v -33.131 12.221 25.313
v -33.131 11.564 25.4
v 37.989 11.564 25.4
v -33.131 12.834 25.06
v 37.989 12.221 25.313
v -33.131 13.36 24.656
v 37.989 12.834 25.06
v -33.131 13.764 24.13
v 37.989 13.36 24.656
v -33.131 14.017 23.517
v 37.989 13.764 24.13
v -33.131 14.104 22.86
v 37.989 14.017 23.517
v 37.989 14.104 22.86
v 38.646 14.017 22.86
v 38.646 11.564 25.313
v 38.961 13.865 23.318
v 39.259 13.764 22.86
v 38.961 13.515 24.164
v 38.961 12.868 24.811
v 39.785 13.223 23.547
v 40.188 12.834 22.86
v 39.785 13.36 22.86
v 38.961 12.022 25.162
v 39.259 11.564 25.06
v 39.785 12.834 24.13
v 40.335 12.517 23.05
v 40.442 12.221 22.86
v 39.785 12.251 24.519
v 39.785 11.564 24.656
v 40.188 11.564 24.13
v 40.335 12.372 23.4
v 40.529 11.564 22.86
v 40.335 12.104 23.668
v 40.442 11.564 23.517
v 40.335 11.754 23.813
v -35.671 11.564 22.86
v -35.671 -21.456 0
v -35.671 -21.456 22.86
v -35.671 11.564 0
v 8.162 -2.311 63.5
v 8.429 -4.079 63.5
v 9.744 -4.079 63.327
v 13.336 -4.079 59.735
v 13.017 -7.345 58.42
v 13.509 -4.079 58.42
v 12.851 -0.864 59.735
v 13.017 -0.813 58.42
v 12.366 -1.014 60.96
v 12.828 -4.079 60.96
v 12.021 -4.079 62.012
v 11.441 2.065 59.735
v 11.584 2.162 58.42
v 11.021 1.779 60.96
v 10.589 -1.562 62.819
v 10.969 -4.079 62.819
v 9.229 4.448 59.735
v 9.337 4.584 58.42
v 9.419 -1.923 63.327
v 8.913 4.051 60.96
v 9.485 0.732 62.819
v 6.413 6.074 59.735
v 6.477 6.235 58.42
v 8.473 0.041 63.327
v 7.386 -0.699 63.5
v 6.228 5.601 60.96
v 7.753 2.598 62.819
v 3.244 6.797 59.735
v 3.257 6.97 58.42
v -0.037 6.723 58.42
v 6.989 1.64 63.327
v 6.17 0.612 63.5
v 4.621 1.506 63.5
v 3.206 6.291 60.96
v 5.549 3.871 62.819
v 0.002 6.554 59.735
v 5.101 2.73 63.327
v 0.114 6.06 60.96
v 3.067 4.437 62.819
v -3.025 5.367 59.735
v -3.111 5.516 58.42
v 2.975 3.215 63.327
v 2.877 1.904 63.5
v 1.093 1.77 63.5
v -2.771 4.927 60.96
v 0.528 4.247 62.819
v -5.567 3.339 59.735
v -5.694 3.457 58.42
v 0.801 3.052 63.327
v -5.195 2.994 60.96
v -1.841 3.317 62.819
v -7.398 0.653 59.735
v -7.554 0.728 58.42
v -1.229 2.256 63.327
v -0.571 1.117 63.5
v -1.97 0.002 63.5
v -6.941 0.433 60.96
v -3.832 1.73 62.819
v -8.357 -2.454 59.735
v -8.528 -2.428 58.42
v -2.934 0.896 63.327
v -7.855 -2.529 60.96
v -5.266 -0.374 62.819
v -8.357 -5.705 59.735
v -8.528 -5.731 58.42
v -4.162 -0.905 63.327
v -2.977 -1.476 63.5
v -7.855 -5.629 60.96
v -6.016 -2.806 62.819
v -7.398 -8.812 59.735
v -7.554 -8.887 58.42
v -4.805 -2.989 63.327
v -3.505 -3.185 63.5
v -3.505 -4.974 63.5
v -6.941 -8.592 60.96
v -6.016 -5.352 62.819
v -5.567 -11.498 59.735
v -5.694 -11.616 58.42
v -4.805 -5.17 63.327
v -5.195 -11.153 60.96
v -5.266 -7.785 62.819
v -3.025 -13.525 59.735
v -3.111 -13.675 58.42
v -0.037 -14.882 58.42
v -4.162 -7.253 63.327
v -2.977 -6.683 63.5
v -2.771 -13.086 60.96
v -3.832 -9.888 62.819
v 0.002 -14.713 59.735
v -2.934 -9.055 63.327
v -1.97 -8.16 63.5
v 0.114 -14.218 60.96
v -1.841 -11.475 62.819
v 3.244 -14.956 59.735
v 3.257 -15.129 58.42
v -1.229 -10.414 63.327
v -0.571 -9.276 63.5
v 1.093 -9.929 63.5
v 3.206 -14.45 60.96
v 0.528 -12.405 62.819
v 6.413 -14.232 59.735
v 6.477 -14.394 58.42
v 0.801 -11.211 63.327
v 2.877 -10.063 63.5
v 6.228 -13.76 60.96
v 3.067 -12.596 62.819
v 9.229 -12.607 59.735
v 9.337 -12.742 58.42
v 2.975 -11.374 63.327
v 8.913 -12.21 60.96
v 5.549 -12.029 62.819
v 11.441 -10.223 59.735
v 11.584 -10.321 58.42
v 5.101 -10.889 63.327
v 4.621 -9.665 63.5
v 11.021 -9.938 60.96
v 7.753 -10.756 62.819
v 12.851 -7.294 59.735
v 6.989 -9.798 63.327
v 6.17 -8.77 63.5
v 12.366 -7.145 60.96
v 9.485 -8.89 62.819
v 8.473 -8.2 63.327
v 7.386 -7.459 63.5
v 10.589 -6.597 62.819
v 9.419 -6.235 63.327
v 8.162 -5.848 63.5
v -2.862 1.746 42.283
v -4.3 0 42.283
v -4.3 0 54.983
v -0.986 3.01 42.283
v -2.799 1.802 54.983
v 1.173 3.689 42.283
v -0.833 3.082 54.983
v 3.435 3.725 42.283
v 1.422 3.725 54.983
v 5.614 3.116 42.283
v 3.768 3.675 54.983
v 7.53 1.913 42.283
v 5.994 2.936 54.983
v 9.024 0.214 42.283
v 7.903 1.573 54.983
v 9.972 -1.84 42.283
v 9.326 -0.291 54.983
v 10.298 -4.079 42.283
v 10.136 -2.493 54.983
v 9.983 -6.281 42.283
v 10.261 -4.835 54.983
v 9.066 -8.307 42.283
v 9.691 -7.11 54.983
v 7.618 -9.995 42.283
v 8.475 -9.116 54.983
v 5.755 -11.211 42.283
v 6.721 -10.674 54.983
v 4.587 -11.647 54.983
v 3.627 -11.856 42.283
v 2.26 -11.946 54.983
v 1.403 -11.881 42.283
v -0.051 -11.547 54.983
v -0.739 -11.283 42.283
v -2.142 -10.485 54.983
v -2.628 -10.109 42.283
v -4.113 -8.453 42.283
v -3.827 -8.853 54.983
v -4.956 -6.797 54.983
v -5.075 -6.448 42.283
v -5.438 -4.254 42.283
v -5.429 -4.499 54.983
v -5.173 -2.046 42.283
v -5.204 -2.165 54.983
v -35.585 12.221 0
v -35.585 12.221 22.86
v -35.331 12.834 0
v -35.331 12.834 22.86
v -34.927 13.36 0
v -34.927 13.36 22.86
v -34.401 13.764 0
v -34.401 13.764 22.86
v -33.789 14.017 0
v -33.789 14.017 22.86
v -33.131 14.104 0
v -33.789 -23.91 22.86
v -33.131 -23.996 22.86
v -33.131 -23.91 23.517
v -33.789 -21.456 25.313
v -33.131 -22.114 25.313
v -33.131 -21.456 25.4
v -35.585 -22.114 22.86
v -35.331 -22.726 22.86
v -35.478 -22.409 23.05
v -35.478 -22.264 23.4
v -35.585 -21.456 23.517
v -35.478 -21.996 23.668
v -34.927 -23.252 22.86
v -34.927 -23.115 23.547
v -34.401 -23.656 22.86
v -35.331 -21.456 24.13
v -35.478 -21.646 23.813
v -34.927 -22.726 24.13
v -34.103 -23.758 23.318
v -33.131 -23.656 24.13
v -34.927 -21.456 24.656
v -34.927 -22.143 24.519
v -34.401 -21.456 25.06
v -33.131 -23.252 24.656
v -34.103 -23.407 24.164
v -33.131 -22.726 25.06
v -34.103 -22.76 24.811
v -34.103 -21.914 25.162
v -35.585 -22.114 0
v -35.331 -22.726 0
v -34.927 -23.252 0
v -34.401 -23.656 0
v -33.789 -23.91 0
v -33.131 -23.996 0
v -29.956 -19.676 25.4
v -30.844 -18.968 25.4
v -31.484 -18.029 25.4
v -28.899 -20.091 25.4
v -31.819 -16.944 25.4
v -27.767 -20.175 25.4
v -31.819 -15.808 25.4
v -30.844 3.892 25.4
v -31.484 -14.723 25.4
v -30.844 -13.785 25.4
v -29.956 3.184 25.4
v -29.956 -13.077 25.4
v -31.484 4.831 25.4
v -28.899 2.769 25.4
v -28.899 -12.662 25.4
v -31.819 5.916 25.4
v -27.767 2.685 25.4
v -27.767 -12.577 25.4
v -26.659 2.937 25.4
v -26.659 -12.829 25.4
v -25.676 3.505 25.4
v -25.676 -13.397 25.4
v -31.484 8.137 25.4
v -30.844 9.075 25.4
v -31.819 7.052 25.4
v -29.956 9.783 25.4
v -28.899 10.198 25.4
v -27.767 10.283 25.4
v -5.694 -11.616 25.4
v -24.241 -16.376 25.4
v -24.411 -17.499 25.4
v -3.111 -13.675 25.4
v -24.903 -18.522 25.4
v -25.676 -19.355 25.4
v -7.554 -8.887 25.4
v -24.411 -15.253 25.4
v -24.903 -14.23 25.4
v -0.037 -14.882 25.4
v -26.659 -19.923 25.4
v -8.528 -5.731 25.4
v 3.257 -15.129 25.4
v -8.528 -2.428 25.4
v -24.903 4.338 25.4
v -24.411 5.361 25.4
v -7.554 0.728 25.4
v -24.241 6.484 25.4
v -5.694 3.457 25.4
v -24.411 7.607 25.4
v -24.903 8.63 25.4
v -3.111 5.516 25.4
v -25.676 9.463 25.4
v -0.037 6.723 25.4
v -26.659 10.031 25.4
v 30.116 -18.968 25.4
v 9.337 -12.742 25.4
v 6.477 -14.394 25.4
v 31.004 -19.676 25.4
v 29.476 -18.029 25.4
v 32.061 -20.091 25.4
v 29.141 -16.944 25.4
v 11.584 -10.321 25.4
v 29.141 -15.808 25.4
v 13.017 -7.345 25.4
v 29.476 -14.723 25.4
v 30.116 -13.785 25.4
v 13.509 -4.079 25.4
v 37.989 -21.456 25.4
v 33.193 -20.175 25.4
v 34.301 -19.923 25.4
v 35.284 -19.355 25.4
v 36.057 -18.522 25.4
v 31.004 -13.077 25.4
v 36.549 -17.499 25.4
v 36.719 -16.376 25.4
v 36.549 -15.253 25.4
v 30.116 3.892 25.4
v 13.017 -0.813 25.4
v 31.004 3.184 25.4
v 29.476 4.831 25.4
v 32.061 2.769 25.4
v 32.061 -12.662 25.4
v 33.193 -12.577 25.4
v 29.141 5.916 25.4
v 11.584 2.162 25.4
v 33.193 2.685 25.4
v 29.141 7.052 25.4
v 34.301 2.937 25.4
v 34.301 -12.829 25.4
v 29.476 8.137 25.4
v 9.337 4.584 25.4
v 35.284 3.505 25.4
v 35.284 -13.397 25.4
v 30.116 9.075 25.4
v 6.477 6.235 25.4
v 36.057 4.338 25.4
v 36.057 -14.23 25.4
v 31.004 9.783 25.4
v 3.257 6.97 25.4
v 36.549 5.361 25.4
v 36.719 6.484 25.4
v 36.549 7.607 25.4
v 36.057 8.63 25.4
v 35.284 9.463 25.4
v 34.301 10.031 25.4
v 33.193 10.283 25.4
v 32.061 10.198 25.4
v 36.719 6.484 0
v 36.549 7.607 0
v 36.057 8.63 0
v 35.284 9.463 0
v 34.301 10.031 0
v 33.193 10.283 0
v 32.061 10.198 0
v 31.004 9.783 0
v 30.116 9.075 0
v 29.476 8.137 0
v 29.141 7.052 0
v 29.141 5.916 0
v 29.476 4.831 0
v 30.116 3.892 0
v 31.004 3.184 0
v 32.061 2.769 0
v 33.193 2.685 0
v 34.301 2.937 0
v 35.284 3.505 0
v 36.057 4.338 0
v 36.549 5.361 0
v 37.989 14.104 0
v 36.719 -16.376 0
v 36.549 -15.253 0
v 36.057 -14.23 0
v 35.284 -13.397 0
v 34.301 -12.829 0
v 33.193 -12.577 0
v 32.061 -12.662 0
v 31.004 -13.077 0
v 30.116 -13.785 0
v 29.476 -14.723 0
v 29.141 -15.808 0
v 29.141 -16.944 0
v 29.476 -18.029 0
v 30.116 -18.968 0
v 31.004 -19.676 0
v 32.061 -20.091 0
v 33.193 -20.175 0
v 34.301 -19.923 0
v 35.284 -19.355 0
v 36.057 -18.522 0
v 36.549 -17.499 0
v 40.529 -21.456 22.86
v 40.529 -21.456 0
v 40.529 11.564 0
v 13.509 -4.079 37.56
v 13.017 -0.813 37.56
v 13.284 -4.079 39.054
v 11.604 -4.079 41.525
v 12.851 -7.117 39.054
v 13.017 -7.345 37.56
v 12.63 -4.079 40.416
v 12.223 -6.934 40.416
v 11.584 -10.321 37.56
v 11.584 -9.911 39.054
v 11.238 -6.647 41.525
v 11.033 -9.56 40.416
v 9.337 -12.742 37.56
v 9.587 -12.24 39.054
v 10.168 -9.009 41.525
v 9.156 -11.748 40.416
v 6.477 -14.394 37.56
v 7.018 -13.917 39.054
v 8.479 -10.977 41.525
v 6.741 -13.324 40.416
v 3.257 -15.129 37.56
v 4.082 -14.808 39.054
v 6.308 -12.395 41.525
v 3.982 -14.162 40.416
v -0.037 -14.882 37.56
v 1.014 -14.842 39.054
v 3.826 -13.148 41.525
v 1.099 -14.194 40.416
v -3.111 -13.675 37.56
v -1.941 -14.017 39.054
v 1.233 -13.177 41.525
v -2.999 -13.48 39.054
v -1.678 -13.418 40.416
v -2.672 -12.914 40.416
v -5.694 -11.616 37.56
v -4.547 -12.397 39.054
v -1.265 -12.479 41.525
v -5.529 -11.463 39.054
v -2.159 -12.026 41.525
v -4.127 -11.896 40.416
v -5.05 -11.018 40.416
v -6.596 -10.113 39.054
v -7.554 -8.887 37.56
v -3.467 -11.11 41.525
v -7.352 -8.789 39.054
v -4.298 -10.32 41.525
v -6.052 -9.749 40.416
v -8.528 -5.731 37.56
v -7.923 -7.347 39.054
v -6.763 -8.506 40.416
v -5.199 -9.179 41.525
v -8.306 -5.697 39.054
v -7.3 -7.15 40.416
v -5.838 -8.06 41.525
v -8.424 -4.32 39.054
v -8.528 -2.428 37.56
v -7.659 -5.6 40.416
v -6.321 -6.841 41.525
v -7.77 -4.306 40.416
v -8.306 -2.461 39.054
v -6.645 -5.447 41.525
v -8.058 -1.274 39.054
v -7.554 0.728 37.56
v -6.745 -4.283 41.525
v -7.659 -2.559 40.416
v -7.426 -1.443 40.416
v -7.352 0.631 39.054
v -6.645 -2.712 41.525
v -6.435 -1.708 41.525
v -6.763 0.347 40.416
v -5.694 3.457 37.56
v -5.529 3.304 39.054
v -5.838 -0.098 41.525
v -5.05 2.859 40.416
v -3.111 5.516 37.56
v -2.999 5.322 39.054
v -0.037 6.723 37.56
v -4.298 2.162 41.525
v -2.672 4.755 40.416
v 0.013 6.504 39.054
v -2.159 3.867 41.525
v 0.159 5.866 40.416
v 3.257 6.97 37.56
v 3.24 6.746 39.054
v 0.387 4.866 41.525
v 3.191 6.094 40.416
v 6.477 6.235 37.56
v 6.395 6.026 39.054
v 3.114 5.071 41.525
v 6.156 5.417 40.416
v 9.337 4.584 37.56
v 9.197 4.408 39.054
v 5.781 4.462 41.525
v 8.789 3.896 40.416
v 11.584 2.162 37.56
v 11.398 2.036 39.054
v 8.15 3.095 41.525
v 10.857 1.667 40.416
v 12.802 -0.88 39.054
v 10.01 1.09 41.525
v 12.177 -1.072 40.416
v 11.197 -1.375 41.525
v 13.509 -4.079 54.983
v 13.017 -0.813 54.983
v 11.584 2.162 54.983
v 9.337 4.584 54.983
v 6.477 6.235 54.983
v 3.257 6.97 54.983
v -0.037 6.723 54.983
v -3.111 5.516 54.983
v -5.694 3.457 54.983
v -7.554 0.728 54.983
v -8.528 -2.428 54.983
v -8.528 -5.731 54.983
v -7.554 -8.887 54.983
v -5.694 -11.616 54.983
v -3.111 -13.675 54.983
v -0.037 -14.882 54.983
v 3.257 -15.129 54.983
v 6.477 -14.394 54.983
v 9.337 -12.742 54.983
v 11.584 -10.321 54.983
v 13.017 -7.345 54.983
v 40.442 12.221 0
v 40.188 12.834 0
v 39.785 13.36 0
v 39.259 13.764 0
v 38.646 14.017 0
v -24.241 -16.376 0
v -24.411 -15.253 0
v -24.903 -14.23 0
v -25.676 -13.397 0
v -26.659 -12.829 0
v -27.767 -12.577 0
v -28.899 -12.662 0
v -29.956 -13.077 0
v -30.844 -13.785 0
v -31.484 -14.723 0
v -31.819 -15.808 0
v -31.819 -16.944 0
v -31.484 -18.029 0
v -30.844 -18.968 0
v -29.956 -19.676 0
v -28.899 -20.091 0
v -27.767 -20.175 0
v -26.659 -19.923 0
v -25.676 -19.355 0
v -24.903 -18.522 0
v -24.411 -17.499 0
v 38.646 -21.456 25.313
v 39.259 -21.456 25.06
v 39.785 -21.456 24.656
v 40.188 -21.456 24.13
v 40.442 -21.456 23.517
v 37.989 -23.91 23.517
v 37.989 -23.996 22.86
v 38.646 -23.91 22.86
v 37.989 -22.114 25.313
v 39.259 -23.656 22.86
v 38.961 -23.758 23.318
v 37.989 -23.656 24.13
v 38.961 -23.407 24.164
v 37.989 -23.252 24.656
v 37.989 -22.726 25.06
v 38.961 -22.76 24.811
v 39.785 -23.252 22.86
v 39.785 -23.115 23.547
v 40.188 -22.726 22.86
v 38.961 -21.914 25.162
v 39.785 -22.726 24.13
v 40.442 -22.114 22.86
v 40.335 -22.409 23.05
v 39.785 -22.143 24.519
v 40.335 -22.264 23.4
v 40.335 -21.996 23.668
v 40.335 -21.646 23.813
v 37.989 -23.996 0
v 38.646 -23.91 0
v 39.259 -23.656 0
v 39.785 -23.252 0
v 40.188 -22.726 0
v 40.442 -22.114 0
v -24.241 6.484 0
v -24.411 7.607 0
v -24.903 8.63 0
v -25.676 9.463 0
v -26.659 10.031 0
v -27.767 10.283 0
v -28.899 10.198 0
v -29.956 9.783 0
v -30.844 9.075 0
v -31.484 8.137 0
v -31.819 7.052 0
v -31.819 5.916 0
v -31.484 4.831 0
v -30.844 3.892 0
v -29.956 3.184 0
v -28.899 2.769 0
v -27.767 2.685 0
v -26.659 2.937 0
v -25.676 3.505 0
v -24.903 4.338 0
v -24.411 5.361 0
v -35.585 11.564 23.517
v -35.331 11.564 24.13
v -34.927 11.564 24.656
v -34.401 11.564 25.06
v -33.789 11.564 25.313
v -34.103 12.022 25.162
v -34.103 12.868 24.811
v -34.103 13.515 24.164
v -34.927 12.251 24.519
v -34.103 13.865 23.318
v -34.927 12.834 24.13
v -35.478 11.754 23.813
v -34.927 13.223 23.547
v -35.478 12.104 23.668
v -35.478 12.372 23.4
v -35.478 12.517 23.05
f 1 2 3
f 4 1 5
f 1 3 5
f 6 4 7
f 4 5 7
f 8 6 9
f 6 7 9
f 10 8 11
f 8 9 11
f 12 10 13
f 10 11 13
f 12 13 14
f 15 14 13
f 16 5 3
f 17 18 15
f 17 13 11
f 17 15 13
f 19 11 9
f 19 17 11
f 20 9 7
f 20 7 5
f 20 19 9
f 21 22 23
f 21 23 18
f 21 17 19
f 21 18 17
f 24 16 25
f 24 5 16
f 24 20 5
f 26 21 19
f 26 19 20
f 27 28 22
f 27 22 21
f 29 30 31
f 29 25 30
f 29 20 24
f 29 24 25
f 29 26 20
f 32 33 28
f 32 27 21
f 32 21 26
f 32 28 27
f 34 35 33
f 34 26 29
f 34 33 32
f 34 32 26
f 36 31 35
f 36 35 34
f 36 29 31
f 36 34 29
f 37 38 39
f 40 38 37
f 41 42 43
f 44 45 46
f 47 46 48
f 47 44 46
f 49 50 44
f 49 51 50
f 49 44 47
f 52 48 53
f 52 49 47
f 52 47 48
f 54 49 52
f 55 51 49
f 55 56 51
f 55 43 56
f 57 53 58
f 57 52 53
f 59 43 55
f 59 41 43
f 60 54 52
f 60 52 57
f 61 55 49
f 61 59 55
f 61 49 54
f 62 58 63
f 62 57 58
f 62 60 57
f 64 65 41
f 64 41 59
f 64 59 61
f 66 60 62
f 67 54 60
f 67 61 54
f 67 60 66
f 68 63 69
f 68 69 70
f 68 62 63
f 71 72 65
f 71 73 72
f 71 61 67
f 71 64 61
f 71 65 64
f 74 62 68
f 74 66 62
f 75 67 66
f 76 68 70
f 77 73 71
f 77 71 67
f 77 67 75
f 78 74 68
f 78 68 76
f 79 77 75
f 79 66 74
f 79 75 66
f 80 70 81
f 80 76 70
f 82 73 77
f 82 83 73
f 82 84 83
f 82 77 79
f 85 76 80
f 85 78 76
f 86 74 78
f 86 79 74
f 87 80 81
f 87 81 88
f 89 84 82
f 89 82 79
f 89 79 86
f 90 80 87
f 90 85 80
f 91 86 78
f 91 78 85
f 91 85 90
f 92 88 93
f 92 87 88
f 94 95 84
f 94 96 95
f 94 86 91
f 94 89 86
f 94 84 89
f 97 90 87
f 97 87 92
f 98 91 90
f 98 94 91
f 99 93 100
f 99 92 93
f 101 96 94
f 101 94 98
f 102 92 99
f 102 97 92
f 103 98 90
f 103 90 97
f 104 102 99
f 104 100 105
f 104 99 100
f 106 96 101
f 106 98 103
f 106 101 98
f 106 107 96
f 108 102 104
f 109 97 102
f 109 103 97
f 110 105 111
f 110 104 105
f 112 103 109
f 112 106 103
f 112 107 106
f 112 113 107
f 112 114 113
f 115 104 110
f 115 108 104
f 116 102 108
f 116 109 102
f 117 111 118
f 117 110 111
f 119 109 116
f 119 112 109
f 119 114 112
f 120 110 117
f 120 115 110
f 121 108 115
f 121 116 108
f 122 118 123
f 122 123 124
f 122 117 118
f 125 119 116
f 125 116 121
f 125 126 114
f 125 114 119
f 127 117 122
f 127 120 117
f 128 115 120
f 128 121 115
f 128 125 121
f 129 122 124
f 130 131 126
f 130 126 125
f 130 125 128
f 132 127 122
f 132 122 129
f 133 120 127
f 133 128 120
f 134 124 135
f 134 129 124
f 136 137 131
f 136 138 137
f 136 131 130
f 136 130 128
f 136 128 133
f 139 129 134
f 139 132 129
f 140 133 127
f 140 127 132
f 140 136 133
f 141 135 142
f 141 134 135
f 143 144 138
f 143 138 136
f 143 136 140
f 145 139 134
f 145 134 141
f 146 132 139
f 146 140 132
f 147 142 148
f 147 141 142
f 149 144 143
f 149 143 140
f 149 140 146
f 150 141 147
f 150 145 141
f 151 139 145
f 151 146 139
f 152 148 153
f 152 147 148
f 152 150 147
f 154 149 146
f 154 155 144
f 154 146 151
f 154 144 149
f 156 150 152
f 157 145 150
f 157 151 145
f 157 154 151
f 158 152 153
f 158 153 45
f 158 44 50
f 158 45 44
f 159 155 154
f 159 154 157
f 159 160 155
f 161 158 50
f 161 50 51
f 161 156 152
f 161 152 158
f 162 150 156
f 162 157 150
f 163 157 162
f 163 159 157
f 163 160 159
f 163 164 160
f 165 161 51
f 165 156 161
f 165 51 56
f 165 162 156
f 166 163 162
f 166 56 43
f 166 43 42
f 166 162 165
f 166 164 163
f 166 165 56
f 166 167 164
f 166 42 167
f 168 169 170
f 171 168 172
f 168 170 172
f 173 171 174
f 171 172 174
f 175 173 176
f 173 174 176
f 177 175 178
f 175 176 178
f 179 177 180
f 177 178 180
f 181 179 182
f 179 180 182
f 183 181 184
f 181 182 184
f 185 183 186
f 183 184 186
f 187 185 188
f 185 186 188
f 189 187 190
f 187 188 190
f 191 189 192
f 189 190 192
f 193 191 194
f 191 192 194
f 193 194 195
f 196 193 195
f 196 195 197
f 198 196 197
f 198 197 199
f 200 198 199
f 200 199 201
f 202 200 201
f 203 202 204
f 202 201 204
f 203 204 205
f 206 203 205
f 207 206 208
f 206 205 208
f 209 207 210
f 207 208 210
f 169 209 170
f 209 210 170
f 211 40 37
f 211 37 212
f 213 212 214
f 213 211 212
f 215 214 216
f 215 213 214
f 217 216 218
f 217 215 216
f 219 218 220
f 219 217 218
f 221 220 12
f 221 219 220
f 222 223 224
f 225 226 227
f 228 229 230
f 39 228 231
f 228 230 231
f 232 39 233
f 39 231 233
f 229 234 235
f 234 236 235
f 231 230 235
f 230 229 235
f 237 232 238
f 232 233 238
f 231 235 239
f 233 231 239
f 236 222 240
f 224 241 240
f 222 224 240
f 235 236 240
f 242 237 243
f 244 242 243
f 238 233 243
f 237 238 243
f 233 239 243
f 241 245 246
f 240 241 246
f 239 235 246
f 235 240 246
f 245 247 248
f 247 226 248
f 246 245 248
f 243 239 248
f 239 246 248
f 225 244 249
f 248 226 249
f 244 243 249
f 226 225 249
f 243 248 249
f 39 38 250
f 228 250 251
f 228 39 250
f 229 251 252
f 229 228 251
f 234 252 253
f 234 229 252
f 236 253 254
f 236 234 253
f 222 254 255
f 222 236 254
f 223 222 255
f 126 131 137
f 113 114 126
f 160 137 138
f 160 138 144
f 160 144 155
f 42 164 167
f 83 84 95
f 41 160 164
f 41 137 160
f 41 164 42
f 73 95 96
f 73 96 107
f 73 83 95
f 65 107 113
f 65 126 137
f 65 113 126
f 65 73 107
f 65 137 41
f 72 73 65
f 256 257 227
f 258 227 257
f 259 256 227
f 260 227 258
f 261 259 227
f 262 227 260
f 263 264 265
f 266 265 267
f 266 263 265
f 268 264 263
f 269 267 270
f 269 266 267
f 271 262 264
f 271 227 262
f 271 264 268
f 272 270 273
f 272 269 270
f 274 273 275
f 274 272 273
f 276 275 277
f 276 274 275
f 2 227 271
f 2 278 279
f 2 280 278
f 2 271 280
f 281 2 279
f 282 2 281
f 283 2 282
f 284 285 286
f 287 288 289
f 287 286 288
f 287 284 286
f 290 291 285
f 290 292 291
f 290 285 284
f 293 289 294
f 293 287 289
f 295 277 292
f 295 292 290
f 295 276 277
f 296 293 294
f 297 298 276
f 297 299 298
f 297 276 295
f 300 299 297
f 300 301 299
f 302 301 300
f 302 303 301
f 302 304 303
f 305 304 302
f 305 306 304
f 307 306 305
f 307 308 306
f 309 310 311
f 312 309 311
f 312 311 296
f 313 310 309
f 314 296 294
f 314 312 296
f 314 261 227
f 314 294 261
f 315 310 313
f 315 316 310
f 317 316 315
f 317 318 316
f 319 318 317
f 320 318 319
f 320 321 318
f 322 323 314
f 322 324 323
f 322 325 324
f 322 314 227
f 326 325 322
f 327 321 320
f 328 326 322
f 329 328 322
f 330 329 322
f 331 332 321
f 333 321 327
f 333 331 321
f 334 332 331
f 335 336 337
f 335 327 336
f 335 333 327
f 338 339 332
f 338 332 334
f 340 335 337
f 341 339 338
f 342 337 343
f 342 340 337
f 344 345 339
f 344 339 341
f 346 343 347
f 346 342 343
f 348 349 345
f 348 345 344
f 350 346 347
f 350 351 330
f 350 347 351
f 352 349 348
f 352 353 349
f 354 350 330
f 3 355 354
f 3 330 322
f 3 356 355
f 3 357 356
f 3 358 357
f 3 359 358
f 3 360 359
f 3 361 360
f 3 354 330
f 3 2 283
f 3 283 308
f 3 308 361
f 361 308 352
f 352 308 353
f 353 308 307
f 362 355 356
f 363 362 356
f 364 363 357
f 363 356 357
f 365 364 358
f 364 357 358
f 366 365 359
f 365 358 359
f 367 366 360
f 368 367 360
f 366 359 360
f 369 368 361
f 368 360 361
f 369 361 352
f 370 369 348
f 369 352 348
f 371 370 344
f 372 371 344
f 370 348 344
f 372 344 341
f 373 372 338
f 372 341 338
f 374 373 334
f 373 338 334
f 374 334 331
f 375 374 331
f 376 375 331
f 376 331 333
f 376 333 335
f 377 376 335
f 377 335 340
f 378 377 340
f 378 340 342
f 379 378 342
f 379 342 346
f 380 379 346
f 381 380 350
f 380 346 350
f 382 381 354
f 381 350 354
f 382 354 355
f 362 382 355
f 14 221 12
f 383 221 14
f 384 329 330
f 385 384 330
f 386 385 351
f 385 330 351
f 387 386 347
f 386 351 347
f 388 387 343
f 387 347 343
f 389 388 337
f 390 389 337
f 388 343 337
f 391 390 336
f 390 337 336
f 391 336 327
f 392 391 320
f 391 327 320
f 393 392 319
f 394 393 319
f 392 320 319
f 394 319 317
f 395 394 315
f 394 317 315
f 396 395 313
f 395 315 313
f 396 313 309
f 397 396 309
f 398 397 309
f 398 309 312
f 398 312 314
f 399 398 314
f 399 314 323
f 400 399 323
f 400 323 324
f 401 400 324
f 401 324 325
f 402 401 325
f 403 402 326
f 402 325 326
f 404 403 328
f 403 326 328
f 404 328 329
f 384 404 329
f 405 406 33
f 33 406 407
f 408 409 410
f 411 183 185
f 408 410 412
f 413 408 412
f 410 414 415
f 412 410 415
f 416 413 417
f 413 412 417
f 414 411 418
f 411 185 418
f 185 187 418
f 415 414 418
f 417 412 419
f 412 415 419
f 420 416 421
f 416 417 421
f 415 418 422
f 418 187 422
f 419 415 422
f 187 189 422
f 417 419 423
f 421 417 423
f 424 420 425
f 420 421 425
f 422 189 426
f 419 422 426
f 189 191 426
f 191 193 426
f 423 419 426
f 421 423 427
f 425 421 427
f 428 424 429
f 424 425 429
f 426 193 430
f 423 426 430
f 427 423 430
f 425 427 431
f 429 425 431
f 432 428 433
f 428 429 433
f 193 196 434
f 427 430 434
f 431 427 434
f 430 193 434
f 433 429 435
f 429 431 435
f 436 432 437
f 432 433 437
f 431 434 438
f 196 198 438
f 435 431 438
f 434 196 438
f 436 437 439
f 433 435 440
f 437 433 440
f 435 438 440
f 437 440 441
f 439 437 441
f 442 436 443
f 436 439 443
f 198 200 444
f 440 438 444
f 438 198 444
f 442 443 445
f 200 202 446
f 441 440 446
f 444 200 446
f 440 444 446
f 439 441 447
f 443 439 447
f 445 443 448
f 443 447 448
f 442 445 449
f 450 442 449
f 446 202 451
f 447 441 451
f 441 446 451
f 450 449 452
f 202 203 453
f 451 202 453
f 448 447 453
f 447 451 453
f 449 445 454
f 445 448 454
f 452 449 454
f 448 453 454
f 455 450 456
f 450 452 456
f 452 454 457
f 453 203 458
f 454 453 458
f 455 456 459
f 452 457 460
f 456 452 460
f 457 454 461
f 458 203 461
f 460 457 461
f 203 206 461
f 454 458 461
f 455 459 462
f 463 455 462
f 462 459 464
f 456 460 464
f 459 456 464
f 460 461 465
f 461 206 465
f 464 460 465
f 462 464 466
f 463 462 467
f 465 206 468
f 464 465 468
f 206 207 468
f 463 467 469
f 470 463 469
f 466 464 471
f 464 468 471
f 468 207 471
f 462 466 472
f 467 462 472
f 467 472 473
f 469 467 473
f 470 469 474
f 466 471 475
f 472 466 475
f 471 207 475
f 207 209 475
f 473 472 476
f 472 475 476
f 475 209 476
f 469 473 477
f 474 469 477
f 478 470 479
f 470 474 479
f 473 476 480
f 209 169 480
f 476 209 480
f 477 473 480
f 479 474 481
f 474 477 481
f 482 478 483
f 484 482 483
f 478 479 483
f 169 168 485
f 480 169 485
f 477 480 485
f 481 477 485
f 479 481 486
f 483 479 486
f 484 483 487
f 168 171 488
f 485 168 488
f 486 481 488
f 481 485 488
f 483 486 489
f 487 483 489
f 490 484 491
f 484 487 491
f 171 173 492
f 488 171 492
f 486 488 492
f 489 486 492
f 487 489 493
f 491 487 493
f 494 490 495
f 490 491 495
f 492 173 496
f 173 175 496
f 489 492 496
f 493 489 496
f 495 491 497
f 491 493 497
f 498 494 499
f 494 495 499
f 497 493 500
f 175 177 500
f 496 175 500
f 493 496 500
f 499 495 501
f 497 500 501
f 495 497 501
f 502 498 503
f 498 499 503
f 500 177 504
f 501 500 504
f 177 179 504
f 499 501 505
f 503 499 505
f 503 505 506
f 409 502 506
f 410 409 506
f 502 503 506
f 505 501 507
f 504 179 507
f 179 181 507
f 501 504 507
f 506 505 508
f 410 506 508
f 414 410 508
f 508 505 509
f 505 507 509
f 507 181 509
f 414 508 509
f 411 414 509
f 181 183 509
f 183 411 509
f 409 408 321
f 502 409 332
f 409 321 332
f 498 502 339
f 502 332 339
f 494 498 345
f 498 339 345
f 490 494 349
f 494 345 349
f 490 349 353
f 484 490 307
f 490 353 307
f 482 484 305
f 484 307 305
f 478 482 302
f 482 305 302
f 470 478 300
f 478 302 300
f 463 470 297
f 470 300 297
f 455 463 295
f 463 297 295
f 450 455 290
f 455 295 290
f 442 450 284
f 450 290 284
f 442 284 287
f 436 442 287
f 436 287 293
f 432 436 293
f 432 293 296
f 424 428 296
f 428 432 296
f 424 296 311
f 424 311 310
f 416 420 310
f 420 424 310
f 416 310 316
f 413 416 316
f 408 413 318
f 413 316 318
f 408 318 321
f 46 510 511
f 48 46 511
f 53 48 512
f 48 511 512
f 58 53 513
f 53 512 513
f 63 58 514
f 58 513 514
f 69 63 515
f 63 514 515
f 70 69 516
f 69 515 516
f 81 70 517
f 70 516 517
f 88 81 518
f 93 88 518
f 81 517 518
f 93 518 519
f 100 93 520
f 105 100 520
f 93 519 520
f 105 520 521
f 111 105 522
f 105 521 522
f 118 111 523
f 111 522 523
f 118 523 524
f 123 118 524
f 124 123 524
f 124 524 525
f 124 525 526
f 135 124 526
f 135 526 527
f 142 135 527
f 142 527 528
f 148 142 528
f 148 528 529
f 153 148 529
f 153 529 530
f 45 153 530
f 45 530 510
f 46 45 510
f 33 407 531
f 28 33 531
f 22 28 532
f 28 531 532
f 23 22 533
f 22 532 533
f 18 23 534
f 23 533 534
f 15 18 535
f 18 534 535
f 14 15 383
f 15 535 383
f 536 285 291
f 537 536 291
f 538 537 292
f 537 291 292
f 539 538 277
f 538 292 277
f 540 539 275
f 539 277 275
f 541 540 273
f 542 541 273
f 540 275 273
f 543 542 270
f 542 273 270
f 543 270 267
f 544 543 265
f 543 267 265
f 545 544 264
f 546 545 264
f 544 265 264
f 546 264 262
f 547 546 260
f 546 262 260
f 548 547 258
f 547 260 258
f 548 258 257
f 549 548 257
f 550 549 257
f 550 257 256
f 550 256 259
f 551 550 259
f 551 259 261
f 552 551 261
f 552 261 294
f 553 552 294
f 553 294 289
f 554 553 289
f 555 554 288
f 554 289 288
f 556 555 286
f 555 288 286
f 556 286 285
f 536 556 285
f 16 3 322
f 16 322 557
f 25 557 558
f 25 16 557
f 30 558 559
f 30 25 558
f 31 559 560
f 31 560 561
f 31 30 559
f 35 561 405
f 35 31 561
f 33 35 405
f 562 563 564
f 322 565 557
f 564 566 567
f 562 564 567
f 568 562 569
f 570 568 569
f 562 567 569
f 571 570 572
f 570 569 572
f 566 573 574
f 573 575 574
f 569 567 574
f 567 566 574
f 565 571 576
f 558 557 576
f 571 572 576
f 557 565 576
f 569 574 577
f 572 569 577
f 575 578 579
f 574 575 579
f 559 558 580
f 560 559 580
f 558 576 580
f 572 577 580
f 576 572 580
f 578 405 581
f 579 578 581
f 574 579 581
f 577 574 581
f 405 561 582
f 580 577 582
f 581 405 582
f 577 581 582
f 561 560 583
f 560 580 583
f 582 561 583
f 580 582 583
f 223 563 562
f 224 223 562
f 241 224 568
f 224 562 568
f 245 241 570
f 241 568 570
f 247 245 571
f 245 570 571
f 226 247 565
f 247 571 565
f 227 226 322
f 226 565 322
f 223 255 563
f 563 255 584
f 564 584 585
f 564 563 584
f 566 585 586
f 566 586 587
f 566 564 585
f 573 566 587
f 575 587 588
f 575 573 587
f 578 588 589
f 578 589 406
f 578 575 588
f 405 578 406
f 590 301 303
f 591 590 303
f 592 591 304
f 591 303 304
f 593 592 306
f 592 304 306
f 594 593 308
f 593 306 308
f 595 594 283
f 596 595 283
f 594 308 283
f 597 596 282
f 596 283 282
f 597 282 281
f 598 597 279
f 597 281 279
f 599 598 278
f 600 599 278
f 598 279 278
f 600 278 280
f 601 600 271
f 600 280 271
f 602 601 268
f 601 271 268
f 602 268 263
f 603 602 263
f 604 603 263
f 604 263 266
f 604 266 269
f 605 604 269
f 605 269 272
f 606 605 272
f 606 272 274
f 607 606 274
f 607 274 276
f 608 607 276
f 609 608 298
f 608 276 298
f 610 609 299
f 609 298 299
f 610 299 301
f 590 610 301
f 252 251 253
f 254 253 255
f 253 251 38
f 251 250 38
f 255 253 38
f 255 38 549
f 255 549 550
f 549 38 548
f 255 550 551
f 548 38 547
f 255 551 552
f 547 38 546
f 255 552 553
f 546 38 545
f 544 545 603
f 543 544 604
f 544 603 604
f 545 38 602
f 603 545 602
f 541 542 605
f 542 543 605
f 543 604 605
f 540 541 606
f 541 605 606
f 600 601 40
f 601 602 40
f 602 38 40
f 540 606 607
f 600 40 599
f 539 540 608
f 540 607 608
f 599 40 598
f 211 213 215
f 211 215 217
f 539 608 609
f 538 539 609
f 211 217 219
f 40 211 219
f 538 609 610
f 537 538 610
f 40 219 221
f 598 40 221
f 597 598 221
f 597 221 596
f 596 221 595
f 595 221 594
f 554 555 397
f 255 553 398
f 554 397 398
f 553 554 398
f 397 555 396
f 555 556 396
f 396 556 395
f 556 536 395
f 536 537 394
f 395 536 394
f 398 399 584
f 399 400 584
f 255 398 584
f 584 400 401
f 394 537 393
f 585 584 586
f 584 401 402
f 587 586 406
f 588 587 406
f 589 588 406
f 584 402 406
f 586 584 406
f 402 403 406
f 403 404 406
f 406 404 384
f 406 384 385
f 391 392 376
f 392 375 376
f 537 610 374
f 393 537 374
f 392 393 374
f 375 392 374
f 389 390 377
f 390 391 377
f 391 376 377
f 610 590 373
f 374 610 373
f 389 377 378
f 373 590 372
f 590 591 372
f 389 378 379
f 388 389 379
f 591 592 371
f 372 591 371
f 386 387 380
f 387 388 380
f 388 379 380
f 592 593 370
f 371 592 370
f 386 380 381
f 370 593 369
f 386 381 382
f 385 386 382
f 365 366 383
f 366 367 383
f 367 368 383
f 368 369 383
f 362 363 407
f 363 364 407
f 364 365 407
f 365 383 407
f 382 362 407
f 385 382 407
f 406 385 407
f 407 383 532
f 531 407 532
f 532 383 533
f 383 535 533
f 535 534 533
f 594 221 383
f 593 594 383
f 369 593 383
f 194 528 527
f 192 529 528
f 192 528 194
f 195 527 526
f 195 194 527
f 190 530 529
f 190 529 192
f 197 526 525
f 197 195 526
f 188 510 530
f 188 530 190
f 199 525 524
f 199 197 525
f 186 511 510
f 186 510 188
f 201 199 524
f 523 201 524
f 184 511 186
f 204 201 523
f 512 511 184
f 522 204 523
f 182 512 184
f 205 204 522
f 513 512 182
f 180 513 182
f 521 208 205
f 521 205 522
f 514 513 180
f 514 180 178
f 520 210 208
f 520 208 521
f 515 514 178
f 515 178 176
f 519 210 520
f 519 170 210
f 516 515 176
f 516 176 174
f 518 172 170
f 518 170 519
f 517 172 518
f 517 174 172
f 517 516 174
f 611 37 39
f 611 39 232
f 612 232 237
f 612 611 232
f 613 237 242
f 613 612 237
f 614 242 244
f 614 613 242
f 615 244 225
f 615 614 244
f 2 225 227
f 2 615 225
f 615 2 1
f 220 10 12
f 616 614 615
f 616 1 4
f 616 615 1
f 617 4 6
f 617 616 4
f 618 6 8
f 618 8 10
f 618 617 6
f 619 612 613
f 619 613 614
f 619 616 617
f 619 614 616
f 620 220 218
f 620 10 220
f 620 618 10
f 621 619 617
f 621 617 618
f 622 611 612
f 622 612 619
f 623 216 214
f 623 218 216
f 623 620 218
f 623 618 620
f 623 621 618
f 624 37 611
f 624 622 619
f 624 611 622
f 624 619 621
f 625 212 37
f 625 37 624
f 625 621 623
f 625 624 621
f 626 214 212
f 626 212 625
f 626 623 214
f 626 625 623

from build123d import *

# Parameters (mm, degrees)
F0_W          = 76.2
F0_H          = 38.1
F1_DEPTH      = 25.4
F3_R          = 3.81
F4_DEPTH      = 25.4
F5_R          = 11.0802185983
F6_DEPTH      = 38.1
F2_R          = 3.81
F7_DEPTH      = 25.4
F8_R          = 3.81
F9_DEPTH      = 25.4
F11_R         = 3.81
F12_DEPTH     = 25.4
F10_W         = 12.7
F10_H         = 12.7
F14_R         = 2.54
F15_R         = 2.54
F17_T1_DEPTH  = 29.21
F17_S5_W      = 2.54
F17_S5_H      = 2.54
F17_T6_DEPTH  = 2.54
F17_S11_W     = 2.54
F17_S11_H     = 2.54
F17_T12_DEPTH = 2.54


# Not quite as in the source:
# - a fillet or chamfer that OpenCascade refuses, or shapes differently, is made with other operations: its cross-section is extruded or revolved along the edge and cut away or added


with BuildPart() as f1:
    # F0 (on Top) → F1 (new body)
    with BuildSketch(Plane.XY):
        with Locations((2.4286340922, -4.9461158044)):
            Rectangle(F0_W, F0_H)
    extrude(amount=F1_DEPTH)

    # F3 (on face) → F4 (cut)
    with BuildSketch(Plane.XY.offset(25.4)):
        with Locations((32.9086340922, 6.4838841956)):
            Circle(F3_R)
    extrude(amount=-F4_DEPTH, mode=Mode.SUBTRACT)

    # F5 (on face) → F6 (join)
    with BuildSketch(Plane.XY.offset(25.4)):
        with Locations((2.4286331609, -4.0792874061)):
            Circle(F5_R)
    extrude(amount=F6_DEPTH)

    # F2 (on face) → F7 (cut)
    with BuildSketch(Plane.XY.offset(25.4)):
        with Locations((-28.0513659078, 6.4838841956)):
            Circle(F2_R)
    extrude(amount=-F7_DEPTH, mode=Mode.SUBTRACT)

    # F8 (on face) → F9 (cut)
    with BuildSketch(Plane.XY.offset(25.4)):
        with Locations((-28.0513659078, -16.3761158044)):
            Circle(F8_R)
    extrude(amount=-F9_DEPTH, mode=Mode.SUBTRACT)

    # F11 (on face) → F12 (cut)
    with BuildSketch(Plane.XY.offset(25.4)):
        with Locations((32.9086340922, -16.3761158044)):
            Circle(F11_R)
    extrude(amount=-F12_DEPTH, mode=Mode.SUBTRACT)

    # F10 (on Front) → F13 (revolve, cut)
    with BuildSketch(Plane.XZ):
        with Locations((-10.6504372485, 48.6334538215)):
            Rectangle(F10_W, F10_H)
    revolve(axis=Axis((2.4286331609, -4.0792874061, 25.4), (0, 0, -1)), mode=Mode.SUBTRACT)

    # F14
    f14_edges = [f1.edges().sort_by_distance(p)[0] for p in [
        (2.428634, -23.996116, 25.4),
    ]]
    fillet(f14_edges, radius=F14_R)

    # F15
    f15_edges = [f1.edges().sort_by_distance(p)[0] for p in [
        (-35.671366, -3.676116, 25.4),
        (2.428634, 14.103884, 25.4),
        (40.528634, -3.676116, 25.4),
    ]]
    fillet(f15_edges, radius=F15_R)

    # F16: fillet of radius 5.08 on 2 edges, made by hand

    # F16_s1 → F16_t2 (revolve, cut)
    with BuildSketch(Plane.XZ.offset(4.0792874061)):
        with BuildLine():
            ThreePointArc((13.5088517592, 58.42), (12.0209542077, 62.0121024484), (8.4288517592, 63.5))
            Line((8.4288517592, 63.5), (8.4288517592, 63.6016))
            Line((8.4288517592, 63.6016), (13.6104517592, 63.6016))
            Line((13.6104517592, 63.6016), (13.6104517592, 58.42))
            Line((13.6104517592, 58.42), (13.5088517592, 58.42))
        make_face()
    revolve(axis=Axis((2.4286331609, -4.0792874061, 63.5), (0, 0, 1)), mode=Mode.SUBTRACT)

    # F16_s3 → F16_t4 (revolve, cut)
    with BuildSketch(Plane.XZ.offset(4.0792874061)):
        with BuildLine():
            ThreePointArc((13.5088517592, 37.5596735125), (12.630027146, 40.4156366371), (10.2976212989, 42.2834538215))
            Line((10.2976212989, 42.2834538215), (10.3349966897, 42.3779294277))
            ThreePointArc((10.3349966897, 42.3779294277), (11.9032365291, 42.3850538215), (13.5088517592, 42.3850538215))
            Line((13.5088517592, 42.3850538215), (13.6104517592, 42.2834538215))
            Line((13.6104517592, 42.2834538215), (13.6104517592, 37.5596735125))
            Line((13.6104517592, 37.5596735125), (13.5088517592, 37.5596735125))
        make_face()
    revolve(axis=Axis((2.4286331609, -4.0792874061, 42.2834538215), (0, 0, -1)), mode=Mode.SUBTRACT)

    # F17: fillet of radius 2.54 on 2 edges, made by hand

    # F17_s2 → F17_t1 (cut)
    with BuildSketch(Plane.XY.offset(-6.35)):
        with BuildLine():
            ThreePointArc((-35.6713659078, 11.5638841956), (-34.927417132, 13.3599354199), (-33.1313659078, 14.1038841956))
            Line((-33.1313659078, 14.1038841956), (-35.6713659078, 14.1038841956))
            Line((-35.6713659078, 14.1038841956), (-35.6713659078, 11.5638841956))
        make_face()
        with BuildLine():
            ThreePointArc((40.5286340922, 11.5638841956), (39.7846853164, 13.3599354199), (37.9886340922, 14.1038841956))
            Line((37.9886340922, 14.1038841956), (40.5286340922, 14.1038841956))
            Line((40.5286340922, 14.1038841956), (40.5286340922, 11.5638841956))
        make_face()
    extrude(amount=F17_T1_DEPTH, mode=Mode.SUBTRACT)


with BuildPart() as f17_tool4:
    # F17_s5 → F17_t6 (new body)
    with BuildSketch(Plane.YZ.offset(37.9886340922)):
        with Locations((12.8338841956, 24.13)):
            Rectangle(F17_S5_W, F17_S5_H)
    extrude(amount=F17_T6_DEPTH)

    # F17_s7 → F17_t8 (revolve, cut)
    with BuildSketch(Plane(origin=(37.9886340922, 11.5638841956, 22.86), x_dir=(0, -0.7071067812, -0.7071067812), z_dir=(0, -0.7071067812, 0.7071067812))):
        with BuildLine():
            ThreePointArc((0, -2.54), (2.54, 0), (0, 2.54))
            Line((0, 2.54), (0, -2.54))
        make_face()
    revolve(axis=Axis((37.9886340922, 11.5638841956, 22.86), (1, 0, 0)), mode=Mode.SUBTRACT)


with BuildPart() as f1_1:
    add(f1.part)

    # F17_t3: cut F17_tool4
    add(f17_tool4.part, mode=Mode.SUBTRACT)


with BuildPart() as f17_tool10:
    # F17_s11 → F17_t12 (new body)
    with BuildSketch(Plane.YZ.offset(-33.1313659078)):
        with Locations((12.8338841956, 24.13)):
            Rectangle(F17_S11_W, F17_S11_H)
    extrude(amount=-F17_T12_DEPTH)

    # F17_s13 → F17_t14 (revolve, cut)
    with BuildSketch(Plane(origin=(-33.1313659078, 11.5638841956, 22.86), x_dir=(0, -0.7071067812, -0.7071067812), z_dir=(0, 0.7071067812, -0.7071067812))):
        with BuildLine():
            ThreePointArc((0, -2.54), (2.54, 0), (0, 2.54))
            Line((0, 2.54), (0, -2.54))
        make_face()
    revolve(axis=Axis((-33.1313659078, 11.5638841956, 22.86), (-1, 0, 0)), mode=Mode.SUBTRACT)


with BuildPart() as f1_2:
    add(f1_1.part)

    # F17_t9: cut F17_tool10
    add(f17_tool10.part, mode=Mode.SUBTRACT)


solid = f1_2.part
